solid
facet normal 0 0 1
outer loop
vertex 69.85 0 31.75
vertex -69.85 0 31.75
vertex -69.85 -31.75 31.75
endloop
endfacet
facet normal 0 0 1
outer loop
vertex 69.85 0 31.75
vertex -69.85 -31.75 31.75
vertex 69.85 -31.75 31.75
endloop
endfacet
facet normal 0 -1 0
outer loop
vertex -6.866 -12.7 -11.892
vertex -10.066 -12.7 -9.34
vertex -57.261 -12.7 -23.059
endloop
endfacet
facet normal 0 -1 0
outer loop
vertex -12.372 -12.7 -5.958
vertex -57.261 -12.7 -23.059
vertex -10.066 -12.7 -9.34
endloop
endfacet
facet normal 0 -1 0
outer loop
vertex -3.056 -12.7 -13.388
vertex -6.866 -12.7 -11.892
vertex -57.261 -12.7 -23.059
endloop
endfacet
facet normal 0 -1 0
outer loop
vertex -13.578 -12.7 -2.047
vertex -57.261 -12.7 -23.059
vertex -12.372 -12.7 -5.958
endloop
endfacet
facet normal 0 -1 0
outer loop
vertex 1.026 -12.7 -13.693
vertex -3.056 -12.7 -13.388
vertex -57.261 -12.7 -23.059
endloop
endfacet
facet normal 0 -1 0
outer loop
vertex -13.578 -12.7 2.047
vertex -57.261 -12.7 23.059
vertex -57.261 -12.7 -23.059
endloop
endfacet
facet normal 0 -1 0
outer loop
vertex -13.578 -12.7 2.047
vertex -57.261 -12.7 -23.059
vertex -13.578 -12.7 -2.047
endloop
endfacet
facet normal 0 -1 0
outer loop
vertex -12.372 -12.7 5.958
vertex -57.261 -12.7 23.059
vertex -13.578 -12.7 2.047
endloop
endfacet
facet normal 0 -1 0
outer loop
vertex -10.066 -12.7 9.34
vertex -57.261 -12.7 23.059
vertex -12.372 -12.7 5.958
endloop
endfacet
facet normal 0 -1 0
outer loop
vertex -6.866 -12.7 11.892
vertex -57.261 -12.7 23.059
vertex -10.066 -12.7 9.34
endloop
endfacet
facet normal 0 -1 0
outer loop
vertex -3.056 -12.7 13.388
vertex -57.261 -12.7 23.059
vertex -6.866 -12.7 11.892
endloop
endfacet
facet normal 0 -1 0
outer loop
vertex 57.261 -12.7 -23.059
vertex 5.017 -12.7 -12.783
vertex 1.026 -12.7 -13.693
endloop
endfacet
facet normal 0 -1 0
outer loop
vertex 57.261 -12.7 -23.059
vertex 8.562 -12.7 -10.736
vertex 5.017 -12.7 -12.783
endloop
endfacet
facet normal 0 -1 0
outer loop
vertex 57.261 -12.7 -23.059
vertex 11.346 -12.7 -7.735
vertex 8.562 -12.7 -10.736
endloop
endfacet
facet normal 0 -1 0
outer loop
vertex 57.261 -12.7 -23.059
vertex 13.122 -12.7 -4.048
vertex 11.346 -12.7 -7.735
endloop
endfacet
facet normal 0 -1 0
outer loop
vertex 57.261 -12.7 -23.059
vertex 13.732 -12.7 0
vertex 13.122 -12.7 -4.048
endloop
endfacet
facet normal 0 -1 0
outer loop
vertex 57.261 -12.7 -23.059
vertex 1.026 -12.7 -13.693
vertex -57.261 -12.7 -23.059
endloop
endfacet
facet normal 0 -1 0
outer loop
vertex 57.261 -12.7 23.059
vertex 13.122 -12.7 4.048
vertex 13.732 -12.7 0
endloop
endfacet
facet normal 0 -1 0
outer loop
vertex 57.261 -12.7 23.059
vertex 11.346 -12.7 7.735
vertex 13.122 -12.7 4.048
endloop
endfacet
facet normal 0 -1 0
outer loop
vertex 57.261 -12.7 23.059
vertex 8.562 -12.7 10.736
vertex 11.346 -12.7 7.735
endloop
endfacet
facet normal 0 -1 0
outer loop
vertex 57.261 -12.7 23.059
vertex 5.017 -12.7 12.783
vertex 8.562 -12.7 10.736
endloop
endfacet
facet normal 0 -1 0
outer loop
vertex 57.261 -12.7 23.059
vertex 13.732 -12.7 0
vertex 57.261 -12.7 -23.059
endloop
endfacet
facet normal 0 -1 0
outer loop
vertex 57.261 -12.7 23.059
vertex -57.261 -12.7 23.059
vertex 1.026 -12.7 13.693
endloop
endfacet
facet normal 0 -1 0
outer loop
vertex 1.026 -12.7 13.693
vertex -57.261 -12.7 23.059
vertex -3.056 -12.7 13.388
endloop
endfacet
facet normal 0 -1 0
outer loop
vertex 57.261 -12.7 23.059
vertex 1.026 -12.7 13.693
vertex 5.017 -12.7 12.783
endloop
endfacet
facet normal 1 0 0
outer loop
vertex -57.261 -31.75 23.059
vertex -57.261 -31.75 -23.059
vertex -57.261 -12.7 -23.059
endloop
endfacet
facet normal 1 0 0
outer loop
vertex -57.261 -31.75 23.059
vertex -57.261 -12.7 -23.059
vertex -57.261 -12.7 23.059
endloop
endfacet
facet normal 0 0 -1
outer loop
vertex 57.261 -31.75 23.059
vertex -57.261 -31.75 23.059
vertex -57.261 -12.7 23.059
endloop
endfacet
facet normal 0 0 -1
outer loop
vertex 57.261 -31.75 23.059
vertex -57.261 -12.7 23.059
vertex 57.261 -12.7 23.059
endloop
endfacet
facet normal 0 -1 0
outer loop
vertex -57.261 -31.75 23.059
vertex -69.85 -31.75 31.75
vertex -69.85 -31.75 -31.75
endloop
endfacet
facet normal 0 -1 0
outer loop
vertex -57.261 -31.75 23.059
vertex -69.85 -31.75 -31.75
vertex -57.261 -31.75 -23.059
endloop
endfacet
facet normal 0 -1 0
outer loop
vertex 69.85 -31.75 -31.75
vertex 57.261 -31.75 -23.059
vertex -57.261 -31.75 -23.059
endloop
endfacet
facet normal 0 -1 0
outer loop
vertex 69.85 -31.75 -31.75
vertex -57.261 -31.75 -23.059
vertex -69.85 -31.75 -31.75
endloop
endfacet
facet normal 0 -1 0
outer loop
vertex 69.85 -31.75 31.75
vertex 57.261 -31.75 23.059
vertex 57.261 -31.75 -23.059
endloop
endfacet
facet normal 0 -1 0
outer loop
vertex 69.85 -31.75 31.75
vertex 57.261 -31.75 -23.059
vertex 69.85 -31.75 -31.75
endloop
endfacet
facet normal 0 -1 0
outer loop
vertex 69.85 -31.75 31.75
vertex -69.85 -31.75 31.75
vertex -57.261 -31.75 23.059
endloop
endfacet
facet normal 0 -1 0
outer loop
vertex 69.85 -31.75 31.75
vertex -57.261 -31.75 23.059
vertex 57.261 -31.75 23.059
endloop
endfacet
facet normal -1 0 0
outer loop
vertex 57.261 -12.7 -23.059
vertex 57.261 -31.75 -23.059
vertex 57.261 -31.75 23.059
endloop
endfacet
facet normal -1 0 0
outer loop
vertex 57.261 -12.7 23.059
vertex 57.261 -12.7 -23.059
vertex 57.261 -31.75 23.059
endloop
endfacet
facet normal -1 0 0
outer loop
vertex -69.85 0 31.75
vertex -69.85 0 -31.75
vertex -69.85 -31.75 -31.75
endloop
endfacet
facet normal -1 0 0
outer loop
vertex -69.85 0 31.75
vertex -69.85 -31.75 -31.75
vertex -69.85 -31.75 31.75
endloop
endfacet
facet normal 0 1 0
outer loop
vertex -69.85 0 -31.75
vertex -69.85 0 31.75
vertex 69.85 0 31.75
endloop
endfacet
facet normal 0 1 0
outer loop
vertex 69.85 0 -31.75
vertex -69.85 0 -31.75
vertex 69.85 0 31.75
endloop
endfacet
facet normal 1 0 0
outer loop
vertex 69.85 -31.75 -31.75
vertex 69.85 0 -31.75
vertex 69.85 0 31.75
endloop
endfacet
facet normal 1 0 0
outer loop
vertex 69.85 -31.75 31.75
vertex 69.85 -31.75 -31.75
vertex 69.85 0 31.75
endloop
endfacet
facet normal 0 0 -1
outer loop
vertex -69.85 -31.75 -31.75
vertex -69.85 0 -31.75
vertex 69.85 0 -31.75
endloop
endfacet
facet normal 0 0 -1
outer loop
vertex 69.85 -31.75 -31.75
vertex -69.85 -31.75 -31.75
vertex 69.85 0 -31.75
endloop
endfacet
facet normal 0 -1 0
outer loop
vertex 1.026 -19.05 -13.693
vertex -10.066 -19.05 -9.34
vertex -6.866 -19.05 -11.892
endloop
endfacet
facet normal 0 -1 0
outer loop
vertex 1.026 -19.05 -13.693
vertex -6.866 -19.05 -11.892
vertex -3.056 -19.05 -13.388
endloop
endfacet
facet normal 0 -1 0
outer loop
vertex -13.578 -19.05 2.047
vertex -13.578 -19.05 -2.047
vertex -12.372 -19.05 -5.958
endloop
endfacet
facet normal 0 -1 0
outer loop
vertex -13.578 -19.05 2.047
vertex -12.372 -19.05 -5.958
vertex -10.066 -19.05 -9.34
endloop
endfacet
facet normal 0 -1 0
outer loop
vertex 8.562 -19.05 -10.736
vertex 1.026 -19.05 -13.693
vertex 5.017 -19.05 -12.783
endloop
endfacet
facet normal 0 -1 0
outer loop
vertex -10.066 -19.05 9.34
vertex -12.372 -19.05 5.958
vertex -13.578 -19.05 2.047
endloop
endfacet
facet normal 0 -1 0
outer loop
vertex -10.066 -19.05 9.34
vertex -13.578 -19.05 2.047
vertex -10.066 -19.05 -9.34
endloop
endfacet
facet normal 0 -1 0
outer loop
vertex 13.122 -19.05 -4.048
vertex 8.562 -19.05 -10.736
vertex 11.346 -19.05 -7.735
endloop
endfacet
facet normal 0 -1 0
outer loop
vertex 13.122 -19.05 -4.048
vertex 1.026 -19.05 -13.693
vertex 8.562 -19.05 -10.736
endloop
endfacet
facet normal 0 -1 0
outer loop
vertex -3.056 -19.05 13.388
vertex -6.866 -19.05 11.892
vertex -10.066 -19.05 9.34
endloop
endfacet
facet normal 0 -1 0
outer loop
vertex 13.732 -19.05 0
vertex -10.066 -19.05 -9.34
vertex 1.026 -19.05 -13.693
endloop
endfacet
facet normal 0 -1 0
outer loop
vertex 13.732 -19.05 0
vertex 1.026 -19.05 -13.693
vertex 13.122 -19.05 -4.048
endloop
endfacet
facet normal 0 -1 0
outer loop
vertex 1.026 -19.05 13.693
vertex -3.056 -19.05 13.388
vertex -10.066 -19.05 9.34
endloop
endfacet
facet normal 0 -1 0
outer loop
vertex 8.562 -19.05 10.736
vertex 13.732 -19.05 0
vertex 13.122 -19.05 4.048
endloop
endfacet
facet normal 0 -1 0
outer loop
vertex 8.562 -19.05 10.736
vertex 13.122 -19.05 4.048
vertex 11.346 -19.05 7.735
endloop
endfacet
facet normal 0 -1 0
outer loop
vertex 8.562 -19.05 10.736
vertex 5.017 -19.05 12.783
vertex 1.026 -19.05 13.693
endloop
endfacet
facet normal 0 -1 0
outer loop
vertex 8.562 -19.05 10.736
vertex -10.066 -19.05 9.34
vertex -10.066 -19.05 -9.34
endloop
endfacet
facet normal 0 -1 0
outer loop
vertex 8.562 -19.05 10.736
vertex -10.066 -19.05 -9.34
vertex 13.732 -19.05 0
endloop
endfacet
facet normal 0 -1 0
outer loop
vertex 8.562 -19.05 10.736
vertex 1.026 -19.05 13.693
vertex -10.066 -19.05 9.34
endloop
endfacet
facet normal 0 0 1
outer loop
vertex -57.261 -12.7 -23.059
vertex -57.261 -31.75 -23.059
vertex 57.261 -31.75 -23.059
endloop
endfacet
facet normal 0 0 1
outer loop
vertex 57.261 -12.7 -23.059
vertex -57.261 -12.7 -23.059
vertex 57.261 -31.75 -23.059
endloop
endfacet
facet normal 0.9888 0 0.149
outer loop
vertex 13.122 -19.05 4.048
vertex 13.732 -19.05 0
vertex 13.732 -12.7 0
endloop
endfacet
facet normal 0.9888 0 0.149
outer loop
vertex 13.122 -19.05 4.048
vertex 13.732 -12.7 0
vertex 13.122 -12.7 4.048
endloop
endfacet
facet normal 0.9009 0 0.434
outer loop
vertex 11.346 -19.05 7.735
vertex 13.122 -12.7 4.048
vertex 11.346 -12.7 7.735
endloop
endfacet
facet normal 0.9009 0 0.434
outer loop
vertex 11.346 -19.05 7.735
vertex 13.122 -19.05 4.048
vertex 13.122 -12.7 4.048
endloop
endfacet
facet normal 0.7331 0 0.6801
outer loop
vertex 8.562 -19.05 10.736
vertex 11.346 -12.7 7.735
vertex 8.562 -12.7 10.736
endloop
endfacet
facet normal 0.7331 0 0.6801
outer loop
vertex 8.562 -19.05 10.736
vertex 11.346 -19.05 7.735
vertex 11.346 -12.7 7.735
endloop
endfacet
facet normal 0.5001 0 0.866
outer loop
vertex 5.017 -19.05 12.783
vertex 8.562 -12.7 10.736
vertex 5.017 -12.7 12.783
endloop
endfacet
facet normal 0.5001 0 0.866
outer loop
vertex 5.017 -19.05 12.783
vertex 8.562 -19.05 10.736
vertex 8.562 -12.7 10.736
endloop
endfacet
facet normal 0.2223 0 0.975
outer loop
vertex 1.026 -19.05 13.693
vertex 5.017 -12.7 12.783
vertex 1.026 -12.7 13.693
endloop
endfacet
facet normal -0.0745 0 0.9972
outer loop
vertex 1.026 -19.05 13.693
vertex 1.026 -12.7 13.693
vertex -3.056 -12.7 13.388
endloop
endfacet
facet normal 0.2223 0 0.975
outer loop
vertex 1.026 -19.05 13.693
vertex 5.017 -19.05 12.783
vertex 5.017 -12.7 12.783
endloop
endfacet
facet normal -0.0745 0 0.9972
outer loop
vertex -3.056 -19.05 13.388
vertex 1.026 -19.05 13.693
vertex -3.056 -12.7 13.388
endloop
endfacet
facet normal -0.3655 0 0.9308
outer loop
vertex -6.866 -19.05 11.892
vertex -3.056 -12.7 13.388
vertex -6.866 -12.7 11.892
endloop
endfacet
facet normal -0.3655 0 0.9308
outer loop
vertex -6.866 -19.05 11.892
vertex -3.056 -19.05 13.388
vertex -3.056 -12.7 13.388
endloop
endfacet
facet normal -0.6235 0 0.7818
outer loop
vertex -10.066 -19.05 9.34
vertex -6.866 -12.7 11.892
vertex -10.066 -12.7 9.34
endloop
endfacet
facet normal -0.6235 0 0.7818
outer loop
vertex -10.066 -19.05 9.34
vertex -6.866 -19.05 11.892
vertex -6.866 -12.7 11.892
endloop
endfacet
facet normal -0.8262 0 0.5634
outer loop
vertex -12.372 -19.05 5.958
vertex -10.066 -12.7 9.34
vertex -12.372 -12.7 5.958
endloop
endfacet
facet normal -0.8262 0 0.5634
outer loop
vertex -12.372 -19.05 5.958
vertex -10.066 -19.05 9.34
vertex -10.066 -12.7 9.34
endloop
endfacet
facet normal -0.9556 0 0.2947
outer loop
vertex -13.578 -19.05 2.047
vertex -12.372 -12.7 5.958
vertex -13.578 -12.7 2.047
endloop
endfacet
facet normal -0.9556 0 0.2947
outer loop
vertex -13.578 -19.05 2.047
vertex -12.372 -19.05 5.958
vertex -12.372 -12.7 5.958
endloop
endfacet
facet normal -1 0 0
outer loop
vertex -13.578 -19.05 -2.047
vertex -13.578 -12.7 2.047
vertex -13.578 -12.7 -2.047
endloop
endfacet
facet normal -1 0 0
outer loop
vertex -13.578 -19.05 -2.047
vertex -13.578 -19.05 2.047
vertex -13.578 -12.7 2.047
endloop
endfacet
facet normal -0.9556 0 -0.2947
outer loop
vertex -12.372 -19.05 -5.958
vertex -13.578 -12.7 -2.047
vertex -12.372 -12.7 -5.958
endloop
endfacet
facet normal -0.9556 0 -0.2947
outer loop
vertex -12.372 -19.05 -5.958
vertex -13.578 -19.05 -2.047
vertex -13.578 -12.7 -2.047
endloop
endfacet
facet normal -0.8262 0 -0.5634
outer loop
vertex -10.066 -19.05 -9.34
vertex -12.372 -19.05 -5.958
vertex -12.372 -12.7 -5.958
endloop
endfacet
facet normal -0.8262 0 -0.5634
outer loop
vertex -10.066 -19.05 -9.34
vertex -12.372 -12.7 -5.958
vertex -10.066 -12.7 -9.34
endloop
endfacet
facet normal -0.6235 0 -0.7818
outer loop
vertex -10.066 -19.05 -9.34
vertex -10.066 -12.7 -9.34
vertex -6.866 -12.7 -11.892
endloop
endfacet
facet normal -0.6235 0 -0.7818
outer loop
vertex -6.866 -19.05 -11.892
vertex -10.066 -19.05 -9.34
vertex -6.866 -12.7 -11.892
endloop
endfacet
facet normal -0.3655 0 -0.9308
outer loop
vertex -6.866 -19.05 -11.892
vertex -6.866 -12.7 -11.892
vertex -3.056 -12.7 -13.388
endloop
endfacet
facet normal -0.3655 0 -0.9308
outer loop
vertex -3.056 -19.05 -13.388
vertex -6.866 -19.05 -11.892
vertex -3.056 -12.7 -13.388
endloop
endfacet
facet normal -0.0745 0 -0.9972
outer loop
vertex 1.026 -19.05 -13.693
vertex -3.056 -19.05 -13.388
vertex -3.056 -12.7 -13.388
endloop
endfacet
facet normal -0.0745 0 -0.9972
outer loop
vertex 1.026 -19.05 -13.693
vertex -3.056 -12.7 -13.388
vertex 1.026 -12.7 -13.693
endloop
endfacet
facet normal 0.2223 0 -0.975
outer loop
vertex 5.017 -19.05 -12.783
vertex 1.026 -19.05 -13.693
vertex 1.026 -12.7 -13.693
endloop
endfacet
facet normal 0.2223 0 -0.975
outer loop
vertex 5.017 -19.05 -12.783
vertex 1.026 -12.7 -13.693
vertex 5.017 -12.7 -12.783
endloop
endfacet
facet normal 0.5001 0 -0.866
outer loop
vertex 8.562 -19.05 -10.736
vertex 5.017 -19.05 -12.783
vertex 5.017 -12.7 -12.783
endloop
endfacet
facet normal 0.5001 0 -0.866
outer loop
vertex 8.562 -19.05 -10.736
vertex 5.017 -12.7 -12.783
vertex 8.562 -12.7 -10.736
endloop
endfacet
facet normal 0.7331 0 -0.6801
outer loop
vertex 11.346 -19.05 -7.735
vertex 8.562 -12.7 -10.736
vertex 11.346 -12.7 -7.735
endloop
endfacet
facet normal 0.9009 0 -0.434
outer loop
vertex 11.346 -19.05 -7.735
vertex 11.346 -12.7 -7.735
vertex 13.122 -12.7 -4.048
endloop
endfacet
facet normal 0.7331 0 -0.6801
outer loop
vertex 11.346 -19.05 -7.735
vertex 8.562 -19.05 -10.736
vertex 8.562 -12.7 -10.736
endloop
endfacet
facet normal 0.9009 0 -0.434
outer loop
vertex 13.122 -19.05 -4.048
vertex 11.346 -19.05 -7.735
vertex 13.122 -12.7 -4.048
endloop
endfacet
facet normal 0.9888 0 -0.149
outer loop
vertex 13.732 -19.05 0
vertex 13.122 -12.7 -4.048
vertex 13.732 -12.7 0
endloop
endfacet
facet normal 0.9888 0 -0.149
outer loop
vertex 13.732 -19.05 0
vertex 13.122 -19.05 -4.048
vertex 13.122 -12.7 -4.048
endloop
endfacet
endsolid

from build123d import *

# Parameters (mm, degrees)
F0_W     = 139.7
F0_H     = 63.5
F1_DEPTH = 31.75
F2_W     = 114.522352
F2_H     = 46.118464
F3_DEPTH = 12.7
F4_W     = 114.522352
F4_H     = 46.118464
F4_R     = 13.731838
F5_DEPTH = 6.35


with BuildPart() as f1:
    # F0 (on Front) → F1 (new body)
    with BuildSketch(Plane.XZ):
        Rectangle(F0_W, F0_H)
    extrude(amount=F1_DEPTH)

    # F2 (on face) → F3 (cut)
    with BuildSketch(Plane.XZ.offset(31.75)):
        Rectangle(F2_W, F2_H)
    extrude(amount=-F3_DEPTH, mode=Mode.SUBTRACT)

    # F4 (on face) → F5 (cut)
    with BuildSketch(Plane.XZ.offset(19.05)):
        Rectangle(F4_W, F4_H)
        Circle(F4_R, mode=Mode.SUBTRACT)
    extrude(amount=-F5_DEPTH, mode=Mode.SUBTRACT)


solid = f1.part
